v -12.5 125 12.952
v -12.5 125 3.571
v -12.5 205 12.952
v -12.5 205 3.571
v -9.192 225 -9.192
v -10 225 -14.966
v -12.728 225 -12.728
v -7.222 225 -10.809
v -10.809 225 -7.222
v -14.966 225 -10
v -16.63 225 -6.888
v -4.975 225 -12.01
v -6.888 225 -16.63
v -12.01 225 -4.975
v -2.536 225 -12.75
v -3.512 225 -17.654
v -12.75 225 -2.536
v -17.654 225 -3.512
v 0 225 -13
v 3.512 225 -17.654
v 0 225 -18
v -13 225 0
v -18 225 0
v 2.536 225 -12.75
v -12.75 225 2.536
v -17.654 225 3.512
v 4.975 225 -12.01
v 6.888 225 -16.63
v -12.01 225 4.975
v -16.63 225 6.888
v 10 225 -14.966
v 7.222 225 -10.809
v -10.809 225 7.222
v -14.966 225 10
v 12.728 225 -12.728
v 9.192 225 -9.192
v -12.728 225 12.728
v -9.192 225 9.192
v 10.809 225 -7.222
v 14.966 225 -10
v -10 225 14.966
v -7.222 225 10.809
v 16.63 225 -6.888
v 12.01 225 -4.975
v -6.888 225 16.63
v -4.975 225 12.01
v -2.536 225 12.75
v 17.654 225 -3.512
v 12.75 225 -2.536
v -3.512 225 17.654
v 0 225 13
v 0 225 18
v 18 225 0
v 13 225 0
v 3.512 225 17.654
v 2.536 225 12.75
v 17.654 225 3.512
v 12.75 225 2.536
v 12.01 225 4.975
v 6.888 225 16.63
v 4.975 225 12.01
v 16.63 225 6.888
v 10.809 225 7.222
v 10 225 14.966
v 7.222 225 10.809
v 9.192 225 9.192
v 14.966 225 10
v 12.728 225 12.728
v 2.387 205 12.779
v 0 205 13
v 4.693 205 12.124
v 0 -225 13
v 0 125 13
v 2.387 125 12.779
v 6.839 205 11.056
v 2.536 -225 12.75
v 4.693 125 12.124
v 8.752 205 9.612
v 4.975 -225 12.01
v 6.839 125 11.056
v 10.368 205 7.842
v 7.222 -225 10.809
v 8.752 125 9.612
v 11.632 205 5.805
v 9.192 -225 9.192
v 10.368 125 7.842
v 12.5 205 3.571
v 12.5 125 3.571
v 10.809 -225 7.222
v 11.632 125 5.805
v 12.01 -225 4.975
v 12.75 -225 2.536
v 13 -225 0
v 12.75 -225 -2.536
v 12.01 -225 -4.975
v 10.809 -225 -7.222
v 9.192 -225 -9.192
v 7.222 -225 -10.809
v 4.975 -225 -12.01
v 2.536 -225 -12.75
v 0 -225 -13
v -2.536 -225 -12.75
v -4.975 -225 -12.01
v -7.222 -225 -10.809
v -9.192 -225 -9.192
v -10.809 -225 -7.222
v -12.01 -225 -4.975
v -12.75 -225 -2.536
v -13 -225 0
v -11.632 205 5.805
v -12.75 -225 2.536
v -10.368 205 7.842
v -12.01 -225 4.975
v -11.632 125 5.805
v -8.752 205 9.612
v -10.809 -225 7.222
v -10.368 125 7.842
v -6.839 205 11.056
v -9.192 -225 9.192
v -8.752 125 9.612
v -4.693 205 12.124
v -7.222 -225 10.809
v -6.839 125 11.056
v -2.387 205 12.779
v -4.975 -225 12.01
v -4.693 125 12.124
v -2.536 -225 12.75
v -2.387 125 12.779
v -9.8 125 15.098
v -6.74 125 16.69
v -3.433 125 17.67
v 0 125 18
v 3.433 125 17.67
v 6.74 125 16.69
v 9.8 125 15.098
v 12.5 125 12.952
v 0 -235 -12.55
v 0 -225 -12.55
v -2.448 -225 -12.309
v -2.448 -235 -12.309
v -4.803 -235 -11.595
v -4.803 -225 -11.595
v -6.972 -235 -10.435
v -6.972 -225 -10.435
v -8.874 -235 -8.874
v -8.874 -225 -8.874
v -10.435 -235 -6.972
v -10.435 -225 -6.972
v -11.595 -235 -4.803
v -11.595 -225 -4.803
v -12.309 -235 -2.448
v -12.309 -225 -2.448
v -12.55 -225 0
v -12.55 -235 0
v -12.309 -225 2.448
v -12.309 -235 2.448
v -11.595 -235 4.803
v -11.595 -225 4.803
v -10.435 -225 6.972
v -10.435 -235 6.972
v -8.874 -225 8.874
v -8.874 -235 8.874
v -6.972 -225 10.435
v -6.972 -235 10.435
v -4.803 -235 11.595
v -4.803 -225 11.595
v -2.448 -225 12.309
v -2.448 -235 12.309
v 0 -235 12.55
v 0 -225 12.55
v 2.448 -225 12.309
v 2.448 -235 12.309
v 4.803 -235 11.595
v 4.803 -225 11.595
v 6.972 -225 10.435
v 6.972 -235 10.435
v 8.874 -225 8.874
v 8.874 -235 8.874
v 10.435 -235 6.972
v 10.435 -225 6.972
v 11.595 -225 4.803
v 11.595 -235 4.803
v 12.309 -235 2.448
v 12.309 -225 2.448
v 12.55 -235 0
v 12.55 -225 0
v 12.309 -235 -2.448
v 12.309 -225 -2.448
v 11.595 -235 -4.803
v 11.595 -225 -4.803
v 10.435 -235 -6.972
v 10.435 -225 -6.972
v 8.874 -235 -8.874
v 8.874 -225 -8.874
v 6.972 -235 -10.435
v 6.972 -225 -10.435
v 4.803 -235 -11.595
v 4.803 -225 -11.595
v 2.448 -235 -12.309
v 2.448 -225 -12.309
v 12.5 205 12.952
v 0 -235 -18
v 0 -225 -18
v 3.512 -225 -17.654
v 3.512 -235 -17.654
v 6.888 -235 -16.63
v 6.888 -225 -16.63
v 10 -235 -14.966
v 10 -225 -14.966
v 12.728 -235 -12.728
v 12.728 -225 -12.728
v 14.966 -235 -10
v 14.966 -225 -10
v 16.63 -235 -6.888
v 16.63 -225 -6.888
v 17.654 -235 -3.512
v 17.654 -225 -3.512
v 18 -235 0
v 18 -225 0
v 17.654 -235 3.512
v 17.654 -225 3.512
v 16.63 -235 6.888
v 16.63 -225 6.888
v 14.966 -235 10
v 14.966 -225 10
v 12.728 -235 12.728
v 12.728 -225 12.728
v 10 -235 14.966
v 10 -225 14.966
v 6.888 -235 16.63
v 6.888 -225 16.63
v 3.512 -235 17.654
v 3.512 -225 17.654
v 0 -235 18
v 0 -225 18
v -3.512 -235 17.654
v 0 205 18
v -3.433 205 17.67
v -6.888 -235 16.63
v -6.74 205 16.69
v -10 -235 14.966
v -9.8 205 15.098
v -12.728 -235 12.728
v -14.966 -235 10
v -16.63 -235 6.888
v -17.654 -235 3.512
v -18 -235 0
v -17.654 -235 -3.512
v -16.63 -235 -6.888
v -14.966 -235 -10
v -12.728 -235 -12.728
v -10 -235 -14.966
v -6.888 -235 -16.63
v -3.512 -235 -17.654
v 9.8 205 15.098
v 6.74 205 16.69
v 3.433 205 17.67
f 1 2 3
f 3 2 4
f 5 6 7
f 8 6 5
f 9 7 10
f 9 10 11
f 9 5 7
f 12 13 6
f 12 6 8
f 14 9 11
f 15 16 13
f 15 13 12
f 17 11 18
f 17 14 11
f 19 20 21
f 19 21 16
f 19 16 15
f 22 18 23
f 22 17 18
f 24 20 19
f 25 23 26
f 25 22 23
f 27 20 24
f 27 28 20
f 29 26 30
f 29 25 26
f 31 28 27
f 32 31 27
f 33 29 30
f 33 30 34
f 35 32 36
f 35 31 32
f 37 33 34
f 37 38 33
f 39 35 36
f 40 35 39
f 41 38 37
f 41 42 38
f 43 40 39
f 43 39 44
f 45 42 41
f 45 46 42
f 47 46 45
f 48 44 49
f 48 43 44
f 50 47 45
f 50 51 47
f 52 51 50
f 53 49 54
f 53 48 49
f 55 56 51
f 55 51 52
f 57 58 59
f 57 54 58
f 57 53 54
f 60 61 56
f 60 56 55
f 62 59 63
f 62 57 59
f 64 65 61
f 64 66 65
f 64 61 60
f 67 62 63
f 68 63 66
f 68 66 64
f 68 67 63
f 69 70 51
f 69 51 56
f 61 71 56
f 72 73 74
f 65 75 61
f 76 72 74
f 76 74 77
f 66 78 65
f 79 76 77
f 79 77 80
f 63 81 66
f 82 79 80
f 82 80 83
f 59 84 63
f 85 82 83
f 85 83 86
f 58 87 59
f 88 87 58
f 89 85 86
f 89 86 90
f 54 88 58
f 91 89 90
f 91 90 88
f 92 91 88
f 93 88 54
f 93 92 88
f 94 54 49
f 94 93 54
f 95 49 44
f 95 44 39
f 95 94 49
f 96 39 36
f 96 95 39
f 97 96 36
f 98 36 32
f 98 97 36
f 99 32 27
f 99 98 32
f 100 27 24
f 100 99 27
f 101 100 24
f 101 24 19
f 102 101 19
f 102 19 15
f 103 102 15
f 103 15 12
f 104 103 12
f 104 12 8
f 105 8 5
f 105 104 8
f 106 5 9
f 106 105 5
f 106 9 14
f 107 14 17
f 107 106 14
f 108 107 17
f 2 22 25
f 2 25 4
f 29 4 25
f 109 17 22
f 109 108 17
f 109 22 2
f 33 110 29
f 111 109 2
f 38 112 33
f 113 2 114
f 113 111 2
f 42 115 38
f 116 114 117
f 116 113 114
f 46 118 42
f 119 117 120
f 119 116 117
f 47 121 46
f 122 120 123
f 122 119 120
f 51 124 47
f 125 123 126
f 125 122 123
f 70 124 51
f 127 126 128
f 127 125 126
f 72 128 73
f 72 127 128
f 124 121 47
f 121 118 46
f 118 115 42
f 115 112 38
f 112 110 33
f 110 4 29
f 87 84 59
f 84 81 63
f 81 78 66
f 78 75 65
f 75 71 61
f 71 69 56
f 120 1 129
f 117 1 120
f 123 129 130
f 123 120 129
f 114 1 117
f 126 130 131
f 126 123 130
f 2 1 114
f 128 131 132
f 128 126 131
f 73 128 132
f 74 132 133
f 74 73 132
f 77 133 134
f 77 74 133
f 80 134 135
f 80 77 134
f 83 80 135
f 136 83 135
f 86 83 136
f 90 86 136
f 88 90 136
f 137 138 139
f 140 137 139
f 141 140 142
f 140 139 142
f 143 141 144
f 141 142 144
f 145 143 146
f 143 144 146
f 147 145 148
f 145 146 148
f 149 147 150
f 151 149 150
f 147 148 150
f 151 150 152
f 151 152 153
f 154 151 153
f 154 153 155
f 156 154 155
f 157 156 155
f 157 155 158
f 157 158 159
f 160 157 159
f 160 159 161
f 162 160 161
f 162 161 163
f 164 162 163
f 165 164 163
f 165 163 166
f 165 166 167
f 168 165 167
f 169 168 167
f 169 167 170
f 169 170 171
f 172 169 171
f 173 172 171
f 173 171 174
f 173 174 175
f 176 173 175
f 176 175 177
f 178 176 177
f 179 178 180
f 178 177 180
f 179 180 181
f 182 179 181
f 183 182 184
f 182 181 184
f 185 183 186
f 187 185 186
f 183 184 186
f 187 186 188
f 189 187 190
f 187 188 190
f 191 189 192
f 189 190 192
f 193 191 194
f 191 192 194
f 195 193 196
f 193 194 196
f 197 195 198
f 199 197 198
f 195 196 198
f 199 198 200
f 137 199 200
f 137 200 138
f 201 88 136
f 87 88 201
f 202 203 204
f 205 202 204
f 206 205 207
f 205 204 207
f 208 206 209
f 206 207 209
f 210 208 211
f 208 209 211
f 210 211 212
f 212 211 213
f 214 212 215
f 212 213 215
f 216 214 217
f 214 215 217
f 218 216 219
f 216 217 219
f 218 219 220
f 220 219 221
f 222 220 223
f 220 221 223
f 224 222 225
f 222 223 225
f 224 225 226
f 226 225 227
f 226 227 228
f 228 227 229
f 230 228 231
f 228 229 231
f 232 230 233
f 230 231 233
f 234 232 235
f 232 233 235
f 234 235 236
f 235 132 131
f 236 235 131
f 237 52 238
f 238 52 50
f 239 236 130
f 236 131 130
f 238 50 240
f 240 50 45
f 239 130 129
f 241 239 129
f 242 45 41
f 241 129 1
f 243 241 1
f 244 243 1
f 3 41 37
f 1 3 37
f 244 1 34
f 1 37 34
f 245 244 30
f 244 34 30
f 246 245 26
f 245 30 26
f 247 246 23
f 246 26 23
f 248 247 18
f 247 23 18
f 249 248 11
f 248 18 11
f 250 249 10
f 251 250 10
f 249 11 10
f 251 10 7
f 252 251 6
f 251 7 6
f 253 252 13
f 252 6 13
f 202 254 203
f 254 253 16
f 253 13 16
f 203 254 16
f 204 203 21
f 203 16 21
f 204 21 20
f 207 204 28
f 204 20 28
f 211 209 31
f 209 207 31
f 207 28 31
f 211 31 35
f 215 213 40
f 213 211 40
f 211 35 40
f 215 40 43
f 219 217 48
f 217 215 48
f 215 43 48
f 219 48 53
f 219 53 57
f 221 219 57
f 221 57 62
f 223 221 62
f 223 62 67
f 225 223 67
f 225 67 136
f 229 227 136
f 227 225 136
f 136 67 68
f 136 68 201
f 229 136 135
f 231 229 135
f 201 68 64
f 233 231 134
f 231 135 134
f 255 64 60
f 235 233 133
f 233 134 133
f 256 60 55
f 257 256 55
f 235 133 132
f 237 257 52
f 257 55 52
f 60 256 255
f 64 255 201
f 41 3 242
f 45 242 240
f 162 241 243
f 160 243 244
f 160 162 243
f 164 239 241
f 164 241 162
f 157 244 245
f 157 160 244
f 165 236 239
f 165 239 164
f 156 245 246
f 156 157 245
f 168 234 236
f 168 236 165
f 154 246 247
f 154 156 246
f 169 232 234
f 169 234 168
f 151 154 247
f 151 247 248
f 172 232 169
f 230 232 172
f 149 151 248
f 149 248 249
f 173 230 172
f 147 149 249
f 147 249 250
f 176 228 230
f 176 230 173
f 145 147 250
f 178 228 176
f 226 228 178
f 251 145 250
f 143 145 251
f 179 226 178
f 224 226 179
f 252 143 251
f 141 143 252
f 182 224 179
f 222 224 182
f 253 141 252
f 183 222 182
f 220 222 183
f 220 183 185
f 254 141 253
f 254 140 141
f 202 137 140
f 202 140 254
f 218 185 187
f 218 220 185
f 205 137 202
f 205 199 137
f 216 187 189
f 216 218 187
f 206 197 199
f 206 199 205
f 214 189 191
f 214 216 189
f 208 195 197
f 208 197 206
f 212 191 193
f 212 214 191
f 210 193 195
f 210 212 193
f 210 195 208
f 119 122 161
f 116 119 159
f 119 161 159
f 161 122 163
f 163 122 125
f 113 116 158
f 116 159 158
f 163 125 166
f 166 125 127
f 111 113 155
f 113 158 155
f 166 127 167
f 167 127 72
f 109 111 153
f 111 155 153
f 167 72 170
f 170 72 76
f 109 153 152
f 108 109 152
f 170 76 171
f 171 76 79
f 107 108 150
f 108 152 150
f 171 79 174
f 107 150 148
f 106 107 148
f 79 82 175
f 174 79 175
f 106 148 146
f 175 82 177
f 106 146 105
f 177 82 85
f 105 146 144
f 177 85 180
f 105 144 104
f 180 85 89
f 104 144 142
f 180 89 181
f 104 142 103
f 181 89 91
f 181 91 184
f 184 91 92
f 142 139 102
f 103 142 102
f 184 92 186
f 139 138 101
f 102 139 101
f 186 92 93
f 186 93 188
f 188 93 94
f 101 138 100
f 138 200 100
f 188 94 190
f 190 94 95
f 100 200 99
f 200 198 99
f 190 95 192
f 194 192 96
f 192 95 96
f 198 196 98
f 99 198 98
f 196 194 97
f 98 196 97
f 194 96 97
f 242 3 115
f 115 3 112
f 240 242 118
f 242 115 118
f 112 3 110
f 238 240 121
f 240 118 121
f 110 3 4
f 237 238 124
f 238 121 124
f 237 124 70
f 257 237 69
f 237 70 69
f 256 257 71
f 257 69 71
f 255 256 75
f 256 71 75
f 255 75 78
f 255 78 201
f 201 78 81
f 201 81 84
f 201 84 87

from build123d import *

# Parameters (mm, degrees)
SKETCH1_R           = 18
SKETCH1_R_2         = 13
BOSS_EXTRUDE1_DEPTH = 225
SKETCH8_R           = 18
BOSS_EXTRUDE3_DEPTH = 10
SKETCH9_R           = 12.55
CUT_EXTRUDE2_DEPTH  = 899.5
SKETCH23_W          = 25
SKETCH23_H          = 80
CUT_EXTRUDE16_DEPTH = 30


with BuildPart() as part:
    # Sketch1 → Boss-Extrude1 (new, symmetric)
    with BuildSketch(Plane(origin=(0, 0, 0), x_dir=(1, 0, 0), z_dir=(0, 1, 0))):
        Circle(SKETCH1_R)
        Circle(SKETCH1_R_2, mode=Mode.SUBTRACT)
    extrude(amount=BOSS_EXTRUDE1_DEPTH, both=True)

    # Sketch8 → Boss-Extrude3 (add)
    with BuildSketch(Plane.XZ.offset(225)):
        Circle(SKETCH8_R)
    extrude(amount=BOSS_EXTRUDE3_DEPTH)

    # Sketch9 → Cut-Extrude2 (cut)
    with BuildSketch(Plane(origin=(-32.302786122, 416.289190775, -45.221901395), x_dir=(-0.9768887275019512, 0, 0.2137484832217963), z_dir=(0, 1, 0))):
        with Locations((-21.890114798, 51.081437247)):
            Circle(SKETCH9_R)
    extrude(amount=-CUT_EXTRUDE2_DEPTH, mode=Mode.SUBTRACT)

    # Sketch23 → Cut-Extrude16 (cut)
    with BuildSketch(Plane.XY):
        with Locations((0, 165)):
            Rectangle(SKETCH23_W, SKETCH23_H)
    extrude(amount=CUT_EXTRUDE16_DEPTH, mode=Mode.SUBTRACT)


solid = part.part
